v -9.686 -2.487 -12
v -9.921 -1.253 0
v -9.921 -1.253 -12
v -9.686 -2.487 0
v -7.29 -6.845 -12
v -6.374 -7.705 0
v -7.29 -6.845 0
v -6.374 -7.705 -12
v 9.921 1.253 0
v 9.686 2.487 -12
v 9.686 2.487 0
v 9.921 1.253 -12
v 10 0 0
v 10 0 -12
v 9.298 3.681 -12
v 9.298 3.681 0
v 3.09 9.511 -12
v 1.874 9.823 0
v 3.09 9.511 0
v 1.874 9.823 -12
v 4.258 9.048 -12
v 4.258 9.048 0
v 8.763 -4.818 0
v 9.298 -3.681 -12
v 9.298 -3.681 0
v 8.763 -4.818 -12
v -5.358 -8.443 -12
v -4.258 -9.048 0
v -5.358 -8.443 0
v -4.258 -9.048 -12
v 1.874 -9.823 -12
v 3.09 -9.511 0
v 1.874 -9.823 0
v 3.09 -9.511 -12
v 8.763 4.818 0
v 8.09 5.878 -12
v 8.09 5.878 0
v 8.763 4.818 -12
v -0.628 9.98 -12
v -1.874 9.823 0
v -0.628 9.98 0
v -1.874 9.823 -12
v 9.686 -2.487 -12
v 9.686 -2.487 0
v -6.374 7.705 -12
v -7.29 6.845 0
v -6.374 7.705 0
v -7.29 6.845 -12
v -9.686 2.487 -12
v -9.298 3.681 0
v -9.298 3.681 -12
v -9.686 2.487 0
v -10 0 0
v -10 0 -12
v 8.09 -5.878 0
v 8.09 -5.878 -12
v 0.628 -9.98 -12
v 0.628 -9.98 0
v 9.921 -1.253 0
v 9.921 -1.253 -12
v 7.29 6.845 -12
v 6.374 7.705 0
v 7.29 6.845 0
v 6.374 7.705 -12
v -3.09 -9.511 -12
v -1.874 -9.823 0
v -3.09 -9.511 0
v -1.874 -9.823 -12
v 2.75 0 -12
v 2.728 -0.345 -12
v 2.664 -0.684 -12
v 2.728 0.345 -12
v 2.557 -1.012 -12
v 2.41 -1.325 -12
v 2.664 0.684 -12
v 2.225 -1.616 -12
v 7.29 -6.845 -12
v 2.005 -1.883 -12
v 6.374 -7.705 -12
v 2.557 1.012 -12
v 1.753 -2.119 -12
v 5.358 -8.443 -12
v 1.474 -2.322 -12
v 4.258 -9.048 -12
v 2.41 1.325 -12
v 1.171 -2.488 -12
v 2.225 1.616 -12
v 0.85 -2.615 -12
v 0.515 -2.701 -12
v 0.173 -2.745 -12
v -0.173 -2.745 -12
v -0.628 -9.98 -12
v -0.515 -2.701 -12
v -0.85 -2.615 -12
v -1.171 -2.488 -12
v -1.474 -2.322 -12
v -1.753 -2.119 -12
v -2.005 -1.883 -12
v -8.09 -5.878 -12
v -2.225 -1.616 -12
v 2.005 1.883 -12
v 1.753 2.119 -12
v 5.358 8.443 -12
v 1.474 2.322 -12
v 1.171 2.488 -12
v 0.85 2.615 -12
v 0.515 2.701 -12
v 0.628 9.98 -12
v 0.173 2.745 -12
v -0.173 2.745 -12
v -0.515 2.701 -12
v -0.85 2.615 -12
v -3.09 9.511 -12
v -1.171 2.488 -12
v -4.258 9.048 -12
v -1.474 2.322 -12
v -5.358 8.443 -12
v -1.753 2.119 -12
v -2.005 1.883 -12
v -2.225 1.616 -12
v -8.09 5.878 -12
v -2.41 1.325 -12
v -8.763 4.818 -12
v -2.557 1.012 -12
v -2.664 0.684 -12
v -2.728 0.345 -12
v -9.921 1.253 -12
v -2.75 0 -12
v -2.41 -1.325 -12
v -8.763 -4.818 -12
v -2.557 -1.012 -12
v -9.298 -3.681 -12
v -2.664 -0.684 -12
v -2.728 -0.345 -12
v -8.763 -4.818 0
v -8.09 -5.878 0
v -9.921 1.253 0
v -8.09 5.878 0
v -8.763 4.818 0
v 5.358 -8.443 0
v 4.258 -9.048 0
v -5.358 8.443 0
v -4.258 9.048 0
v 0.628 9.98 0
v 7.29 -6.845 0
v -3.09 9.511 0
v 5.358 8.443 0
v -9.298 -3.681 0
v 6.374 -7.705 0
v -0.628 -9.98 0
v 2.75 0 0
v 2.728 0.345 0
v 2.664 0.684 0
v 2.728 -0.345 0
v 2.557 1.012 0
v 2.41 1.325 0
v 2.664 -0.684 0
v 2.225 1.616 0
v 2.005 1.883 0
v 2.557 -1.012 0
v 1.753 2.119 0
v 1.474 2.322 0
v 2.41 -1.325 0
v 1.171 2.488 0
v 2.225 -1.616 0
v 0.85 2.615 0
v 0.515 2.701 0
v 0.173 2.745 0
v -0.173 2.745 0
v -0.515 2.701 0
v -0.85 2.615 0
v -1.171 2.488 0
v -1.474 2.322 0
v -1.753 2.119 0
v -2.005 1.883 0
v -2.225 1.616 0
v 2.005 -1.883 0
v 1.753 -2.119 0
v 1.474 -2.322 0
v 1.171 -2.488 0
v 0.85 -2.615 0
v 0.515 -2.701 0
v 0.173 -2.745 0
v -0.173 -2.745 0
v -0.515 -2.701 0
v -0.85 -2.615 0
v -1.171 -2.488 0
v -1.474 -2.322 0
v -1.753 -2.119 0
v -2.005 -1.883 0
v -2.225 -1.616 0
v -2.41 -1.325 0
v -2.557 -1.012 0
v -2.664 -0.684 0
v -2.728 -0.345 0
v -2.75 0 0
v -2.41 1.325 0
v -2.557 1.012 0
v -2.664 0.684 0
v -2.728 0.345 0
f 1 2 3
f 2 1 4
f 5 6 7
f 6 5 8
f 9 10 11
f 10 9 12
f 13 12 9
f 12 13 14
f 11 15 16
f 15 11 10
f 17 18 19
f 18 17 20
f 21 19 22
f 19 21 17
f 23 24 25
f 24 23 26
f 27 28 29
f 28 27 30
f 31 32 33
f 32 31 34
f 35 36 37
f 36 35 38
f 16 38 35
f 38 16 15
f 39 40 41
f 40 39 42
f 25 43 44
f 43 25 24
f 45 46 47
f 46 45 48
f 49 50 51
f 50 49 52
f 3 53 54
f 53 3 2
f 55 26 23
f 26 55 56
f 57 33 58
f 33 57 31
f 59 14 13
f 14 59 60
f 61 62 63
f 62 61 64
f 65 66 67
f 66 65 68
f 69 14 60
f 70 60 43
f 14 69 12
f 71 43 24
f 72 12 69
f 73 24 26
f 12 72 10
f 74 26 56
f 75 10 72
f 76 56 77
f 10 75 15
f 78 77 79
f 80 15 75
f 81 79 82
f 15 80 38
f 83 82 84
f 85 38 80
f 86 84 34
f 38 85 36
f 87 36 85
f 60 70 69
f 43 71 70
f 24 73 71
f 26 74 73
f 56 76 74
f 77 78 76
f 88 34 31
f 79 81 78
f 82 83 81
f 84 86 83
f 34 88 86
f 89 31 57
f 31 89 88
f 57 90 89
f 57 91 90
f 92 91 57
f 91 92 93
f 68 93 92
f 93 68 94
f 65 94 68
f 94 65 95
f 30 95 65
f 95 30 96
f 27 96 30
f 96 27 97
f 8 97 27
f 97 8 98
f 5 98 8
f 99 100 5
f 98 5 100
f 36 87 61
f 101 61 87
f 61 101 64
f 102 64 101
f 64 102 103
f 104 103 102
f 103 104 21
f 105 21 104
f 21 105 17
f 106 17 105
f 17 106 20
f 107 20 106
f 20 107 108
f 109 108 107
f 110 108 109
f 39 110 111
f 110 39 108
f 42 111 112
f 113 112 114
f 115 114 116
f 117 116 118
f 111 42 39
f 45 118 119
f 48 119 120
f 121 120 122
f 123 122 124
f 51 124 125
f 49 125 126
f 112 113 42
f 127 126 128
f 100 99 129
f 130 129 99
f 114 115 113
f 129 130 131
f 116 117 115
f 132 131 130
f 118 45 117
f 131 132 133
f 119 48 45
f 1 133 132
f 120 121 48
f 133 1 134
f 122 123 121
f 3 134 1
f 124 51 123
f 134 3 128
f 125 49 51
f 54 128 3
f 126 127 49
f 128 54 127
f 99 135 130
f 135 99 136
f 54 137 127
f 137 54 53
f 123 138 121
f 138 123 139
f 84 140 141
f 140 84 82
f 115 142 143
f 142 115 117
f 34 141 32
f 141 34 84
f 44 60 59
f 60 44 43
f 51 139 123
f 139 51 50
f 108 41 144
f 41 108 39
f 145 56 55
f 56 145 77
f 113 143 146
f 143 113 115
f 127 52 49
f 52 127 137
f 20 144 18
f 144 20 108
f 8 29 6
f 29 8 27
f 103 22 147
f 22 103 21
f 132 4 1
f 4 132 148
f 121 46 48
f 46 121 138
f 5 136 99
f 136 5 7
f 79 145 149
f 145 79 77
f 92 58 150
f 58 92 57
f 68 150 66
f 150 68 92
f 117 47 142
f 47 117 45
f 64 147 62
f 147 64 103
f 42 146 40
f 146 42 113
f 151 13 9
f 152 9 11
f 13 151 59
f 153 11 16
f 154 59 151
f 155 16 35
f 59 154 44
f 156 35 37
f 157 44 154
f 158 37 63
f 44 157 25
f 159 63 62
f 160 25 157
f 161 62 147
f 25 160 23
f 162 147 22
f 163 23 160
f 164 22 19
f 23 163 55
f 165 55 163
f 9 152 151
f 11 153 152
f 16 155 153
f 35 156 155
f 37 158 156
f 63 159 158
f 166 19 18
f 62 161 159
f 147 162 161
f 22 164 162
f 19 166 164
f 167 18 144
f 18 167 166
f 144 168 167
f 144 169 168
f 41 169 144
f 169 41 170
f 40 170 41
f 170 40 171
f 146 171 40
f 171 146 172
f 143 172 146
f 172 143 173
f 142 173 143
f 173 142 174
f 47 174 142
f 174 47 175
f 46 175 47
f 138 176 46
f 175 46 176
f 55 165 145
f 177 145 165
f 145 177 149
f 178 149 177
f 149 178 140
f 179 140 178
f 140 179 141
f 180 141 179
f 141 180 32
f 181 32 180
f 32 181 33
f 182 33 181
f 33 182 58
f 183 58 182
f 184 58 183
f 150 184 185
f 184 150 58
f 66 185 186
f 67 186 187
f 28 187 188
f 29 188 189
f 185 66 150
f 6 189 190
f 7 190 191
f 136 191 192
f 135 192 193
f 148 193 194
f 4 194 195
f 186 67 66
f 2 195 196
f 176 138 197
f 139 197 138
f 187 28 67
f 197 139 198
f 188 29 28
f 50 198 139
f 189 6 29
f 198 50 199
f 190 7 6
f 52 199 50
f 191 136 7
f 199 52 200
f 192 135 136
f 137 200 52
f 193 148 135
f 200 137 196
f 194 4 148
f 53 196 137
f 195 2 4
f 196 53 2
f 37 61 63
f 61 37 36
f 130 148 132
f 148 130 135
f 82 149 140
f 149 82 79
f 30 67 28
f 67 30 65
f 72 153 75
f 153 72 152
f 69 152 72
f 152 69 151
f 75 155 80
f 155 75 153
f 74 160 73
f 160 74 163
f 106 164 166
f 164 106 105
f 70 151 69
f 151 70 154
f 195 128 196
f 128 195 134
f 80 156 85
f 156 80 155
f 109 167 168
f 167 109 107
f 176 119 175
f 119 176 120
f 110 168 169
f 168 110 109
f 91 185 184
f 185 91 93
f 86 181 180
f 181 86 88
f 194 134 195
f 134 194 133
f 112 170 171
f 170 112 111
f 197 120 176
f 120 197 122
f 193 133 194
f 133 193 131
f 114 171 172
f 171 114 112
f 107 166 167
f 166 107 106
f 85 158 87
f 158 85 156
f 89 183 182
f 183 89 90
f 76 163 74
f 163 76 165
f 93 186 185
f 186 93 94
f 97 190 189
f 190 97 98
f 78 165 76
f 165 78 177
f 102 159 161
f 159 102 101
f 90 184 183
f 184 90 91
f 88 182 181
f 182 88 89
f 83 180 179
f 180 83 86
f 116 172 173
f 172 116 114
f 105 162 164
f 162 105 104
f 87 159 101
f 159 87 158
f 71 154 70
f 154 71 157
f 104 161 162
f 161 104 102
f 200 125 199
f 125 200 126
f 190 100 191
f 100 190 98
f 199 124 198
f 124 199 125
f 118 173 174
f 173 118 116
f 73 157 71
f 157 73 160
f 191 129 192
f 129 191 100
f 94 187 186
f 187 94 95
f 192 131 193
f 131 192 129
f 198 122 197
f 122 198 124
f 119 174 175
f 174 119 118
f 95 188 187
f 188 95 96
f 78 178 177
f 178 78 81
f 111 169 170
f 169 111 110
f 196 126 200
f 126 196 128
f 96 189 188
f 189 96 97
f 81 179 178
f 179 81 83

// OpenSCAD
$fn = 50;


difference() {
	union() {
		translate(v = [0, 0, -12.0000000000]) {
			cylinder(h = 12, r = 10.0000000000);
		}
		cylinder(h = 0, r = 19.0000000000);
	}
	union() {
		#translate(v = [0, 0, -12]) {
			cylinder(h = 12, r = 2.7500000000);
		}
	}
}
